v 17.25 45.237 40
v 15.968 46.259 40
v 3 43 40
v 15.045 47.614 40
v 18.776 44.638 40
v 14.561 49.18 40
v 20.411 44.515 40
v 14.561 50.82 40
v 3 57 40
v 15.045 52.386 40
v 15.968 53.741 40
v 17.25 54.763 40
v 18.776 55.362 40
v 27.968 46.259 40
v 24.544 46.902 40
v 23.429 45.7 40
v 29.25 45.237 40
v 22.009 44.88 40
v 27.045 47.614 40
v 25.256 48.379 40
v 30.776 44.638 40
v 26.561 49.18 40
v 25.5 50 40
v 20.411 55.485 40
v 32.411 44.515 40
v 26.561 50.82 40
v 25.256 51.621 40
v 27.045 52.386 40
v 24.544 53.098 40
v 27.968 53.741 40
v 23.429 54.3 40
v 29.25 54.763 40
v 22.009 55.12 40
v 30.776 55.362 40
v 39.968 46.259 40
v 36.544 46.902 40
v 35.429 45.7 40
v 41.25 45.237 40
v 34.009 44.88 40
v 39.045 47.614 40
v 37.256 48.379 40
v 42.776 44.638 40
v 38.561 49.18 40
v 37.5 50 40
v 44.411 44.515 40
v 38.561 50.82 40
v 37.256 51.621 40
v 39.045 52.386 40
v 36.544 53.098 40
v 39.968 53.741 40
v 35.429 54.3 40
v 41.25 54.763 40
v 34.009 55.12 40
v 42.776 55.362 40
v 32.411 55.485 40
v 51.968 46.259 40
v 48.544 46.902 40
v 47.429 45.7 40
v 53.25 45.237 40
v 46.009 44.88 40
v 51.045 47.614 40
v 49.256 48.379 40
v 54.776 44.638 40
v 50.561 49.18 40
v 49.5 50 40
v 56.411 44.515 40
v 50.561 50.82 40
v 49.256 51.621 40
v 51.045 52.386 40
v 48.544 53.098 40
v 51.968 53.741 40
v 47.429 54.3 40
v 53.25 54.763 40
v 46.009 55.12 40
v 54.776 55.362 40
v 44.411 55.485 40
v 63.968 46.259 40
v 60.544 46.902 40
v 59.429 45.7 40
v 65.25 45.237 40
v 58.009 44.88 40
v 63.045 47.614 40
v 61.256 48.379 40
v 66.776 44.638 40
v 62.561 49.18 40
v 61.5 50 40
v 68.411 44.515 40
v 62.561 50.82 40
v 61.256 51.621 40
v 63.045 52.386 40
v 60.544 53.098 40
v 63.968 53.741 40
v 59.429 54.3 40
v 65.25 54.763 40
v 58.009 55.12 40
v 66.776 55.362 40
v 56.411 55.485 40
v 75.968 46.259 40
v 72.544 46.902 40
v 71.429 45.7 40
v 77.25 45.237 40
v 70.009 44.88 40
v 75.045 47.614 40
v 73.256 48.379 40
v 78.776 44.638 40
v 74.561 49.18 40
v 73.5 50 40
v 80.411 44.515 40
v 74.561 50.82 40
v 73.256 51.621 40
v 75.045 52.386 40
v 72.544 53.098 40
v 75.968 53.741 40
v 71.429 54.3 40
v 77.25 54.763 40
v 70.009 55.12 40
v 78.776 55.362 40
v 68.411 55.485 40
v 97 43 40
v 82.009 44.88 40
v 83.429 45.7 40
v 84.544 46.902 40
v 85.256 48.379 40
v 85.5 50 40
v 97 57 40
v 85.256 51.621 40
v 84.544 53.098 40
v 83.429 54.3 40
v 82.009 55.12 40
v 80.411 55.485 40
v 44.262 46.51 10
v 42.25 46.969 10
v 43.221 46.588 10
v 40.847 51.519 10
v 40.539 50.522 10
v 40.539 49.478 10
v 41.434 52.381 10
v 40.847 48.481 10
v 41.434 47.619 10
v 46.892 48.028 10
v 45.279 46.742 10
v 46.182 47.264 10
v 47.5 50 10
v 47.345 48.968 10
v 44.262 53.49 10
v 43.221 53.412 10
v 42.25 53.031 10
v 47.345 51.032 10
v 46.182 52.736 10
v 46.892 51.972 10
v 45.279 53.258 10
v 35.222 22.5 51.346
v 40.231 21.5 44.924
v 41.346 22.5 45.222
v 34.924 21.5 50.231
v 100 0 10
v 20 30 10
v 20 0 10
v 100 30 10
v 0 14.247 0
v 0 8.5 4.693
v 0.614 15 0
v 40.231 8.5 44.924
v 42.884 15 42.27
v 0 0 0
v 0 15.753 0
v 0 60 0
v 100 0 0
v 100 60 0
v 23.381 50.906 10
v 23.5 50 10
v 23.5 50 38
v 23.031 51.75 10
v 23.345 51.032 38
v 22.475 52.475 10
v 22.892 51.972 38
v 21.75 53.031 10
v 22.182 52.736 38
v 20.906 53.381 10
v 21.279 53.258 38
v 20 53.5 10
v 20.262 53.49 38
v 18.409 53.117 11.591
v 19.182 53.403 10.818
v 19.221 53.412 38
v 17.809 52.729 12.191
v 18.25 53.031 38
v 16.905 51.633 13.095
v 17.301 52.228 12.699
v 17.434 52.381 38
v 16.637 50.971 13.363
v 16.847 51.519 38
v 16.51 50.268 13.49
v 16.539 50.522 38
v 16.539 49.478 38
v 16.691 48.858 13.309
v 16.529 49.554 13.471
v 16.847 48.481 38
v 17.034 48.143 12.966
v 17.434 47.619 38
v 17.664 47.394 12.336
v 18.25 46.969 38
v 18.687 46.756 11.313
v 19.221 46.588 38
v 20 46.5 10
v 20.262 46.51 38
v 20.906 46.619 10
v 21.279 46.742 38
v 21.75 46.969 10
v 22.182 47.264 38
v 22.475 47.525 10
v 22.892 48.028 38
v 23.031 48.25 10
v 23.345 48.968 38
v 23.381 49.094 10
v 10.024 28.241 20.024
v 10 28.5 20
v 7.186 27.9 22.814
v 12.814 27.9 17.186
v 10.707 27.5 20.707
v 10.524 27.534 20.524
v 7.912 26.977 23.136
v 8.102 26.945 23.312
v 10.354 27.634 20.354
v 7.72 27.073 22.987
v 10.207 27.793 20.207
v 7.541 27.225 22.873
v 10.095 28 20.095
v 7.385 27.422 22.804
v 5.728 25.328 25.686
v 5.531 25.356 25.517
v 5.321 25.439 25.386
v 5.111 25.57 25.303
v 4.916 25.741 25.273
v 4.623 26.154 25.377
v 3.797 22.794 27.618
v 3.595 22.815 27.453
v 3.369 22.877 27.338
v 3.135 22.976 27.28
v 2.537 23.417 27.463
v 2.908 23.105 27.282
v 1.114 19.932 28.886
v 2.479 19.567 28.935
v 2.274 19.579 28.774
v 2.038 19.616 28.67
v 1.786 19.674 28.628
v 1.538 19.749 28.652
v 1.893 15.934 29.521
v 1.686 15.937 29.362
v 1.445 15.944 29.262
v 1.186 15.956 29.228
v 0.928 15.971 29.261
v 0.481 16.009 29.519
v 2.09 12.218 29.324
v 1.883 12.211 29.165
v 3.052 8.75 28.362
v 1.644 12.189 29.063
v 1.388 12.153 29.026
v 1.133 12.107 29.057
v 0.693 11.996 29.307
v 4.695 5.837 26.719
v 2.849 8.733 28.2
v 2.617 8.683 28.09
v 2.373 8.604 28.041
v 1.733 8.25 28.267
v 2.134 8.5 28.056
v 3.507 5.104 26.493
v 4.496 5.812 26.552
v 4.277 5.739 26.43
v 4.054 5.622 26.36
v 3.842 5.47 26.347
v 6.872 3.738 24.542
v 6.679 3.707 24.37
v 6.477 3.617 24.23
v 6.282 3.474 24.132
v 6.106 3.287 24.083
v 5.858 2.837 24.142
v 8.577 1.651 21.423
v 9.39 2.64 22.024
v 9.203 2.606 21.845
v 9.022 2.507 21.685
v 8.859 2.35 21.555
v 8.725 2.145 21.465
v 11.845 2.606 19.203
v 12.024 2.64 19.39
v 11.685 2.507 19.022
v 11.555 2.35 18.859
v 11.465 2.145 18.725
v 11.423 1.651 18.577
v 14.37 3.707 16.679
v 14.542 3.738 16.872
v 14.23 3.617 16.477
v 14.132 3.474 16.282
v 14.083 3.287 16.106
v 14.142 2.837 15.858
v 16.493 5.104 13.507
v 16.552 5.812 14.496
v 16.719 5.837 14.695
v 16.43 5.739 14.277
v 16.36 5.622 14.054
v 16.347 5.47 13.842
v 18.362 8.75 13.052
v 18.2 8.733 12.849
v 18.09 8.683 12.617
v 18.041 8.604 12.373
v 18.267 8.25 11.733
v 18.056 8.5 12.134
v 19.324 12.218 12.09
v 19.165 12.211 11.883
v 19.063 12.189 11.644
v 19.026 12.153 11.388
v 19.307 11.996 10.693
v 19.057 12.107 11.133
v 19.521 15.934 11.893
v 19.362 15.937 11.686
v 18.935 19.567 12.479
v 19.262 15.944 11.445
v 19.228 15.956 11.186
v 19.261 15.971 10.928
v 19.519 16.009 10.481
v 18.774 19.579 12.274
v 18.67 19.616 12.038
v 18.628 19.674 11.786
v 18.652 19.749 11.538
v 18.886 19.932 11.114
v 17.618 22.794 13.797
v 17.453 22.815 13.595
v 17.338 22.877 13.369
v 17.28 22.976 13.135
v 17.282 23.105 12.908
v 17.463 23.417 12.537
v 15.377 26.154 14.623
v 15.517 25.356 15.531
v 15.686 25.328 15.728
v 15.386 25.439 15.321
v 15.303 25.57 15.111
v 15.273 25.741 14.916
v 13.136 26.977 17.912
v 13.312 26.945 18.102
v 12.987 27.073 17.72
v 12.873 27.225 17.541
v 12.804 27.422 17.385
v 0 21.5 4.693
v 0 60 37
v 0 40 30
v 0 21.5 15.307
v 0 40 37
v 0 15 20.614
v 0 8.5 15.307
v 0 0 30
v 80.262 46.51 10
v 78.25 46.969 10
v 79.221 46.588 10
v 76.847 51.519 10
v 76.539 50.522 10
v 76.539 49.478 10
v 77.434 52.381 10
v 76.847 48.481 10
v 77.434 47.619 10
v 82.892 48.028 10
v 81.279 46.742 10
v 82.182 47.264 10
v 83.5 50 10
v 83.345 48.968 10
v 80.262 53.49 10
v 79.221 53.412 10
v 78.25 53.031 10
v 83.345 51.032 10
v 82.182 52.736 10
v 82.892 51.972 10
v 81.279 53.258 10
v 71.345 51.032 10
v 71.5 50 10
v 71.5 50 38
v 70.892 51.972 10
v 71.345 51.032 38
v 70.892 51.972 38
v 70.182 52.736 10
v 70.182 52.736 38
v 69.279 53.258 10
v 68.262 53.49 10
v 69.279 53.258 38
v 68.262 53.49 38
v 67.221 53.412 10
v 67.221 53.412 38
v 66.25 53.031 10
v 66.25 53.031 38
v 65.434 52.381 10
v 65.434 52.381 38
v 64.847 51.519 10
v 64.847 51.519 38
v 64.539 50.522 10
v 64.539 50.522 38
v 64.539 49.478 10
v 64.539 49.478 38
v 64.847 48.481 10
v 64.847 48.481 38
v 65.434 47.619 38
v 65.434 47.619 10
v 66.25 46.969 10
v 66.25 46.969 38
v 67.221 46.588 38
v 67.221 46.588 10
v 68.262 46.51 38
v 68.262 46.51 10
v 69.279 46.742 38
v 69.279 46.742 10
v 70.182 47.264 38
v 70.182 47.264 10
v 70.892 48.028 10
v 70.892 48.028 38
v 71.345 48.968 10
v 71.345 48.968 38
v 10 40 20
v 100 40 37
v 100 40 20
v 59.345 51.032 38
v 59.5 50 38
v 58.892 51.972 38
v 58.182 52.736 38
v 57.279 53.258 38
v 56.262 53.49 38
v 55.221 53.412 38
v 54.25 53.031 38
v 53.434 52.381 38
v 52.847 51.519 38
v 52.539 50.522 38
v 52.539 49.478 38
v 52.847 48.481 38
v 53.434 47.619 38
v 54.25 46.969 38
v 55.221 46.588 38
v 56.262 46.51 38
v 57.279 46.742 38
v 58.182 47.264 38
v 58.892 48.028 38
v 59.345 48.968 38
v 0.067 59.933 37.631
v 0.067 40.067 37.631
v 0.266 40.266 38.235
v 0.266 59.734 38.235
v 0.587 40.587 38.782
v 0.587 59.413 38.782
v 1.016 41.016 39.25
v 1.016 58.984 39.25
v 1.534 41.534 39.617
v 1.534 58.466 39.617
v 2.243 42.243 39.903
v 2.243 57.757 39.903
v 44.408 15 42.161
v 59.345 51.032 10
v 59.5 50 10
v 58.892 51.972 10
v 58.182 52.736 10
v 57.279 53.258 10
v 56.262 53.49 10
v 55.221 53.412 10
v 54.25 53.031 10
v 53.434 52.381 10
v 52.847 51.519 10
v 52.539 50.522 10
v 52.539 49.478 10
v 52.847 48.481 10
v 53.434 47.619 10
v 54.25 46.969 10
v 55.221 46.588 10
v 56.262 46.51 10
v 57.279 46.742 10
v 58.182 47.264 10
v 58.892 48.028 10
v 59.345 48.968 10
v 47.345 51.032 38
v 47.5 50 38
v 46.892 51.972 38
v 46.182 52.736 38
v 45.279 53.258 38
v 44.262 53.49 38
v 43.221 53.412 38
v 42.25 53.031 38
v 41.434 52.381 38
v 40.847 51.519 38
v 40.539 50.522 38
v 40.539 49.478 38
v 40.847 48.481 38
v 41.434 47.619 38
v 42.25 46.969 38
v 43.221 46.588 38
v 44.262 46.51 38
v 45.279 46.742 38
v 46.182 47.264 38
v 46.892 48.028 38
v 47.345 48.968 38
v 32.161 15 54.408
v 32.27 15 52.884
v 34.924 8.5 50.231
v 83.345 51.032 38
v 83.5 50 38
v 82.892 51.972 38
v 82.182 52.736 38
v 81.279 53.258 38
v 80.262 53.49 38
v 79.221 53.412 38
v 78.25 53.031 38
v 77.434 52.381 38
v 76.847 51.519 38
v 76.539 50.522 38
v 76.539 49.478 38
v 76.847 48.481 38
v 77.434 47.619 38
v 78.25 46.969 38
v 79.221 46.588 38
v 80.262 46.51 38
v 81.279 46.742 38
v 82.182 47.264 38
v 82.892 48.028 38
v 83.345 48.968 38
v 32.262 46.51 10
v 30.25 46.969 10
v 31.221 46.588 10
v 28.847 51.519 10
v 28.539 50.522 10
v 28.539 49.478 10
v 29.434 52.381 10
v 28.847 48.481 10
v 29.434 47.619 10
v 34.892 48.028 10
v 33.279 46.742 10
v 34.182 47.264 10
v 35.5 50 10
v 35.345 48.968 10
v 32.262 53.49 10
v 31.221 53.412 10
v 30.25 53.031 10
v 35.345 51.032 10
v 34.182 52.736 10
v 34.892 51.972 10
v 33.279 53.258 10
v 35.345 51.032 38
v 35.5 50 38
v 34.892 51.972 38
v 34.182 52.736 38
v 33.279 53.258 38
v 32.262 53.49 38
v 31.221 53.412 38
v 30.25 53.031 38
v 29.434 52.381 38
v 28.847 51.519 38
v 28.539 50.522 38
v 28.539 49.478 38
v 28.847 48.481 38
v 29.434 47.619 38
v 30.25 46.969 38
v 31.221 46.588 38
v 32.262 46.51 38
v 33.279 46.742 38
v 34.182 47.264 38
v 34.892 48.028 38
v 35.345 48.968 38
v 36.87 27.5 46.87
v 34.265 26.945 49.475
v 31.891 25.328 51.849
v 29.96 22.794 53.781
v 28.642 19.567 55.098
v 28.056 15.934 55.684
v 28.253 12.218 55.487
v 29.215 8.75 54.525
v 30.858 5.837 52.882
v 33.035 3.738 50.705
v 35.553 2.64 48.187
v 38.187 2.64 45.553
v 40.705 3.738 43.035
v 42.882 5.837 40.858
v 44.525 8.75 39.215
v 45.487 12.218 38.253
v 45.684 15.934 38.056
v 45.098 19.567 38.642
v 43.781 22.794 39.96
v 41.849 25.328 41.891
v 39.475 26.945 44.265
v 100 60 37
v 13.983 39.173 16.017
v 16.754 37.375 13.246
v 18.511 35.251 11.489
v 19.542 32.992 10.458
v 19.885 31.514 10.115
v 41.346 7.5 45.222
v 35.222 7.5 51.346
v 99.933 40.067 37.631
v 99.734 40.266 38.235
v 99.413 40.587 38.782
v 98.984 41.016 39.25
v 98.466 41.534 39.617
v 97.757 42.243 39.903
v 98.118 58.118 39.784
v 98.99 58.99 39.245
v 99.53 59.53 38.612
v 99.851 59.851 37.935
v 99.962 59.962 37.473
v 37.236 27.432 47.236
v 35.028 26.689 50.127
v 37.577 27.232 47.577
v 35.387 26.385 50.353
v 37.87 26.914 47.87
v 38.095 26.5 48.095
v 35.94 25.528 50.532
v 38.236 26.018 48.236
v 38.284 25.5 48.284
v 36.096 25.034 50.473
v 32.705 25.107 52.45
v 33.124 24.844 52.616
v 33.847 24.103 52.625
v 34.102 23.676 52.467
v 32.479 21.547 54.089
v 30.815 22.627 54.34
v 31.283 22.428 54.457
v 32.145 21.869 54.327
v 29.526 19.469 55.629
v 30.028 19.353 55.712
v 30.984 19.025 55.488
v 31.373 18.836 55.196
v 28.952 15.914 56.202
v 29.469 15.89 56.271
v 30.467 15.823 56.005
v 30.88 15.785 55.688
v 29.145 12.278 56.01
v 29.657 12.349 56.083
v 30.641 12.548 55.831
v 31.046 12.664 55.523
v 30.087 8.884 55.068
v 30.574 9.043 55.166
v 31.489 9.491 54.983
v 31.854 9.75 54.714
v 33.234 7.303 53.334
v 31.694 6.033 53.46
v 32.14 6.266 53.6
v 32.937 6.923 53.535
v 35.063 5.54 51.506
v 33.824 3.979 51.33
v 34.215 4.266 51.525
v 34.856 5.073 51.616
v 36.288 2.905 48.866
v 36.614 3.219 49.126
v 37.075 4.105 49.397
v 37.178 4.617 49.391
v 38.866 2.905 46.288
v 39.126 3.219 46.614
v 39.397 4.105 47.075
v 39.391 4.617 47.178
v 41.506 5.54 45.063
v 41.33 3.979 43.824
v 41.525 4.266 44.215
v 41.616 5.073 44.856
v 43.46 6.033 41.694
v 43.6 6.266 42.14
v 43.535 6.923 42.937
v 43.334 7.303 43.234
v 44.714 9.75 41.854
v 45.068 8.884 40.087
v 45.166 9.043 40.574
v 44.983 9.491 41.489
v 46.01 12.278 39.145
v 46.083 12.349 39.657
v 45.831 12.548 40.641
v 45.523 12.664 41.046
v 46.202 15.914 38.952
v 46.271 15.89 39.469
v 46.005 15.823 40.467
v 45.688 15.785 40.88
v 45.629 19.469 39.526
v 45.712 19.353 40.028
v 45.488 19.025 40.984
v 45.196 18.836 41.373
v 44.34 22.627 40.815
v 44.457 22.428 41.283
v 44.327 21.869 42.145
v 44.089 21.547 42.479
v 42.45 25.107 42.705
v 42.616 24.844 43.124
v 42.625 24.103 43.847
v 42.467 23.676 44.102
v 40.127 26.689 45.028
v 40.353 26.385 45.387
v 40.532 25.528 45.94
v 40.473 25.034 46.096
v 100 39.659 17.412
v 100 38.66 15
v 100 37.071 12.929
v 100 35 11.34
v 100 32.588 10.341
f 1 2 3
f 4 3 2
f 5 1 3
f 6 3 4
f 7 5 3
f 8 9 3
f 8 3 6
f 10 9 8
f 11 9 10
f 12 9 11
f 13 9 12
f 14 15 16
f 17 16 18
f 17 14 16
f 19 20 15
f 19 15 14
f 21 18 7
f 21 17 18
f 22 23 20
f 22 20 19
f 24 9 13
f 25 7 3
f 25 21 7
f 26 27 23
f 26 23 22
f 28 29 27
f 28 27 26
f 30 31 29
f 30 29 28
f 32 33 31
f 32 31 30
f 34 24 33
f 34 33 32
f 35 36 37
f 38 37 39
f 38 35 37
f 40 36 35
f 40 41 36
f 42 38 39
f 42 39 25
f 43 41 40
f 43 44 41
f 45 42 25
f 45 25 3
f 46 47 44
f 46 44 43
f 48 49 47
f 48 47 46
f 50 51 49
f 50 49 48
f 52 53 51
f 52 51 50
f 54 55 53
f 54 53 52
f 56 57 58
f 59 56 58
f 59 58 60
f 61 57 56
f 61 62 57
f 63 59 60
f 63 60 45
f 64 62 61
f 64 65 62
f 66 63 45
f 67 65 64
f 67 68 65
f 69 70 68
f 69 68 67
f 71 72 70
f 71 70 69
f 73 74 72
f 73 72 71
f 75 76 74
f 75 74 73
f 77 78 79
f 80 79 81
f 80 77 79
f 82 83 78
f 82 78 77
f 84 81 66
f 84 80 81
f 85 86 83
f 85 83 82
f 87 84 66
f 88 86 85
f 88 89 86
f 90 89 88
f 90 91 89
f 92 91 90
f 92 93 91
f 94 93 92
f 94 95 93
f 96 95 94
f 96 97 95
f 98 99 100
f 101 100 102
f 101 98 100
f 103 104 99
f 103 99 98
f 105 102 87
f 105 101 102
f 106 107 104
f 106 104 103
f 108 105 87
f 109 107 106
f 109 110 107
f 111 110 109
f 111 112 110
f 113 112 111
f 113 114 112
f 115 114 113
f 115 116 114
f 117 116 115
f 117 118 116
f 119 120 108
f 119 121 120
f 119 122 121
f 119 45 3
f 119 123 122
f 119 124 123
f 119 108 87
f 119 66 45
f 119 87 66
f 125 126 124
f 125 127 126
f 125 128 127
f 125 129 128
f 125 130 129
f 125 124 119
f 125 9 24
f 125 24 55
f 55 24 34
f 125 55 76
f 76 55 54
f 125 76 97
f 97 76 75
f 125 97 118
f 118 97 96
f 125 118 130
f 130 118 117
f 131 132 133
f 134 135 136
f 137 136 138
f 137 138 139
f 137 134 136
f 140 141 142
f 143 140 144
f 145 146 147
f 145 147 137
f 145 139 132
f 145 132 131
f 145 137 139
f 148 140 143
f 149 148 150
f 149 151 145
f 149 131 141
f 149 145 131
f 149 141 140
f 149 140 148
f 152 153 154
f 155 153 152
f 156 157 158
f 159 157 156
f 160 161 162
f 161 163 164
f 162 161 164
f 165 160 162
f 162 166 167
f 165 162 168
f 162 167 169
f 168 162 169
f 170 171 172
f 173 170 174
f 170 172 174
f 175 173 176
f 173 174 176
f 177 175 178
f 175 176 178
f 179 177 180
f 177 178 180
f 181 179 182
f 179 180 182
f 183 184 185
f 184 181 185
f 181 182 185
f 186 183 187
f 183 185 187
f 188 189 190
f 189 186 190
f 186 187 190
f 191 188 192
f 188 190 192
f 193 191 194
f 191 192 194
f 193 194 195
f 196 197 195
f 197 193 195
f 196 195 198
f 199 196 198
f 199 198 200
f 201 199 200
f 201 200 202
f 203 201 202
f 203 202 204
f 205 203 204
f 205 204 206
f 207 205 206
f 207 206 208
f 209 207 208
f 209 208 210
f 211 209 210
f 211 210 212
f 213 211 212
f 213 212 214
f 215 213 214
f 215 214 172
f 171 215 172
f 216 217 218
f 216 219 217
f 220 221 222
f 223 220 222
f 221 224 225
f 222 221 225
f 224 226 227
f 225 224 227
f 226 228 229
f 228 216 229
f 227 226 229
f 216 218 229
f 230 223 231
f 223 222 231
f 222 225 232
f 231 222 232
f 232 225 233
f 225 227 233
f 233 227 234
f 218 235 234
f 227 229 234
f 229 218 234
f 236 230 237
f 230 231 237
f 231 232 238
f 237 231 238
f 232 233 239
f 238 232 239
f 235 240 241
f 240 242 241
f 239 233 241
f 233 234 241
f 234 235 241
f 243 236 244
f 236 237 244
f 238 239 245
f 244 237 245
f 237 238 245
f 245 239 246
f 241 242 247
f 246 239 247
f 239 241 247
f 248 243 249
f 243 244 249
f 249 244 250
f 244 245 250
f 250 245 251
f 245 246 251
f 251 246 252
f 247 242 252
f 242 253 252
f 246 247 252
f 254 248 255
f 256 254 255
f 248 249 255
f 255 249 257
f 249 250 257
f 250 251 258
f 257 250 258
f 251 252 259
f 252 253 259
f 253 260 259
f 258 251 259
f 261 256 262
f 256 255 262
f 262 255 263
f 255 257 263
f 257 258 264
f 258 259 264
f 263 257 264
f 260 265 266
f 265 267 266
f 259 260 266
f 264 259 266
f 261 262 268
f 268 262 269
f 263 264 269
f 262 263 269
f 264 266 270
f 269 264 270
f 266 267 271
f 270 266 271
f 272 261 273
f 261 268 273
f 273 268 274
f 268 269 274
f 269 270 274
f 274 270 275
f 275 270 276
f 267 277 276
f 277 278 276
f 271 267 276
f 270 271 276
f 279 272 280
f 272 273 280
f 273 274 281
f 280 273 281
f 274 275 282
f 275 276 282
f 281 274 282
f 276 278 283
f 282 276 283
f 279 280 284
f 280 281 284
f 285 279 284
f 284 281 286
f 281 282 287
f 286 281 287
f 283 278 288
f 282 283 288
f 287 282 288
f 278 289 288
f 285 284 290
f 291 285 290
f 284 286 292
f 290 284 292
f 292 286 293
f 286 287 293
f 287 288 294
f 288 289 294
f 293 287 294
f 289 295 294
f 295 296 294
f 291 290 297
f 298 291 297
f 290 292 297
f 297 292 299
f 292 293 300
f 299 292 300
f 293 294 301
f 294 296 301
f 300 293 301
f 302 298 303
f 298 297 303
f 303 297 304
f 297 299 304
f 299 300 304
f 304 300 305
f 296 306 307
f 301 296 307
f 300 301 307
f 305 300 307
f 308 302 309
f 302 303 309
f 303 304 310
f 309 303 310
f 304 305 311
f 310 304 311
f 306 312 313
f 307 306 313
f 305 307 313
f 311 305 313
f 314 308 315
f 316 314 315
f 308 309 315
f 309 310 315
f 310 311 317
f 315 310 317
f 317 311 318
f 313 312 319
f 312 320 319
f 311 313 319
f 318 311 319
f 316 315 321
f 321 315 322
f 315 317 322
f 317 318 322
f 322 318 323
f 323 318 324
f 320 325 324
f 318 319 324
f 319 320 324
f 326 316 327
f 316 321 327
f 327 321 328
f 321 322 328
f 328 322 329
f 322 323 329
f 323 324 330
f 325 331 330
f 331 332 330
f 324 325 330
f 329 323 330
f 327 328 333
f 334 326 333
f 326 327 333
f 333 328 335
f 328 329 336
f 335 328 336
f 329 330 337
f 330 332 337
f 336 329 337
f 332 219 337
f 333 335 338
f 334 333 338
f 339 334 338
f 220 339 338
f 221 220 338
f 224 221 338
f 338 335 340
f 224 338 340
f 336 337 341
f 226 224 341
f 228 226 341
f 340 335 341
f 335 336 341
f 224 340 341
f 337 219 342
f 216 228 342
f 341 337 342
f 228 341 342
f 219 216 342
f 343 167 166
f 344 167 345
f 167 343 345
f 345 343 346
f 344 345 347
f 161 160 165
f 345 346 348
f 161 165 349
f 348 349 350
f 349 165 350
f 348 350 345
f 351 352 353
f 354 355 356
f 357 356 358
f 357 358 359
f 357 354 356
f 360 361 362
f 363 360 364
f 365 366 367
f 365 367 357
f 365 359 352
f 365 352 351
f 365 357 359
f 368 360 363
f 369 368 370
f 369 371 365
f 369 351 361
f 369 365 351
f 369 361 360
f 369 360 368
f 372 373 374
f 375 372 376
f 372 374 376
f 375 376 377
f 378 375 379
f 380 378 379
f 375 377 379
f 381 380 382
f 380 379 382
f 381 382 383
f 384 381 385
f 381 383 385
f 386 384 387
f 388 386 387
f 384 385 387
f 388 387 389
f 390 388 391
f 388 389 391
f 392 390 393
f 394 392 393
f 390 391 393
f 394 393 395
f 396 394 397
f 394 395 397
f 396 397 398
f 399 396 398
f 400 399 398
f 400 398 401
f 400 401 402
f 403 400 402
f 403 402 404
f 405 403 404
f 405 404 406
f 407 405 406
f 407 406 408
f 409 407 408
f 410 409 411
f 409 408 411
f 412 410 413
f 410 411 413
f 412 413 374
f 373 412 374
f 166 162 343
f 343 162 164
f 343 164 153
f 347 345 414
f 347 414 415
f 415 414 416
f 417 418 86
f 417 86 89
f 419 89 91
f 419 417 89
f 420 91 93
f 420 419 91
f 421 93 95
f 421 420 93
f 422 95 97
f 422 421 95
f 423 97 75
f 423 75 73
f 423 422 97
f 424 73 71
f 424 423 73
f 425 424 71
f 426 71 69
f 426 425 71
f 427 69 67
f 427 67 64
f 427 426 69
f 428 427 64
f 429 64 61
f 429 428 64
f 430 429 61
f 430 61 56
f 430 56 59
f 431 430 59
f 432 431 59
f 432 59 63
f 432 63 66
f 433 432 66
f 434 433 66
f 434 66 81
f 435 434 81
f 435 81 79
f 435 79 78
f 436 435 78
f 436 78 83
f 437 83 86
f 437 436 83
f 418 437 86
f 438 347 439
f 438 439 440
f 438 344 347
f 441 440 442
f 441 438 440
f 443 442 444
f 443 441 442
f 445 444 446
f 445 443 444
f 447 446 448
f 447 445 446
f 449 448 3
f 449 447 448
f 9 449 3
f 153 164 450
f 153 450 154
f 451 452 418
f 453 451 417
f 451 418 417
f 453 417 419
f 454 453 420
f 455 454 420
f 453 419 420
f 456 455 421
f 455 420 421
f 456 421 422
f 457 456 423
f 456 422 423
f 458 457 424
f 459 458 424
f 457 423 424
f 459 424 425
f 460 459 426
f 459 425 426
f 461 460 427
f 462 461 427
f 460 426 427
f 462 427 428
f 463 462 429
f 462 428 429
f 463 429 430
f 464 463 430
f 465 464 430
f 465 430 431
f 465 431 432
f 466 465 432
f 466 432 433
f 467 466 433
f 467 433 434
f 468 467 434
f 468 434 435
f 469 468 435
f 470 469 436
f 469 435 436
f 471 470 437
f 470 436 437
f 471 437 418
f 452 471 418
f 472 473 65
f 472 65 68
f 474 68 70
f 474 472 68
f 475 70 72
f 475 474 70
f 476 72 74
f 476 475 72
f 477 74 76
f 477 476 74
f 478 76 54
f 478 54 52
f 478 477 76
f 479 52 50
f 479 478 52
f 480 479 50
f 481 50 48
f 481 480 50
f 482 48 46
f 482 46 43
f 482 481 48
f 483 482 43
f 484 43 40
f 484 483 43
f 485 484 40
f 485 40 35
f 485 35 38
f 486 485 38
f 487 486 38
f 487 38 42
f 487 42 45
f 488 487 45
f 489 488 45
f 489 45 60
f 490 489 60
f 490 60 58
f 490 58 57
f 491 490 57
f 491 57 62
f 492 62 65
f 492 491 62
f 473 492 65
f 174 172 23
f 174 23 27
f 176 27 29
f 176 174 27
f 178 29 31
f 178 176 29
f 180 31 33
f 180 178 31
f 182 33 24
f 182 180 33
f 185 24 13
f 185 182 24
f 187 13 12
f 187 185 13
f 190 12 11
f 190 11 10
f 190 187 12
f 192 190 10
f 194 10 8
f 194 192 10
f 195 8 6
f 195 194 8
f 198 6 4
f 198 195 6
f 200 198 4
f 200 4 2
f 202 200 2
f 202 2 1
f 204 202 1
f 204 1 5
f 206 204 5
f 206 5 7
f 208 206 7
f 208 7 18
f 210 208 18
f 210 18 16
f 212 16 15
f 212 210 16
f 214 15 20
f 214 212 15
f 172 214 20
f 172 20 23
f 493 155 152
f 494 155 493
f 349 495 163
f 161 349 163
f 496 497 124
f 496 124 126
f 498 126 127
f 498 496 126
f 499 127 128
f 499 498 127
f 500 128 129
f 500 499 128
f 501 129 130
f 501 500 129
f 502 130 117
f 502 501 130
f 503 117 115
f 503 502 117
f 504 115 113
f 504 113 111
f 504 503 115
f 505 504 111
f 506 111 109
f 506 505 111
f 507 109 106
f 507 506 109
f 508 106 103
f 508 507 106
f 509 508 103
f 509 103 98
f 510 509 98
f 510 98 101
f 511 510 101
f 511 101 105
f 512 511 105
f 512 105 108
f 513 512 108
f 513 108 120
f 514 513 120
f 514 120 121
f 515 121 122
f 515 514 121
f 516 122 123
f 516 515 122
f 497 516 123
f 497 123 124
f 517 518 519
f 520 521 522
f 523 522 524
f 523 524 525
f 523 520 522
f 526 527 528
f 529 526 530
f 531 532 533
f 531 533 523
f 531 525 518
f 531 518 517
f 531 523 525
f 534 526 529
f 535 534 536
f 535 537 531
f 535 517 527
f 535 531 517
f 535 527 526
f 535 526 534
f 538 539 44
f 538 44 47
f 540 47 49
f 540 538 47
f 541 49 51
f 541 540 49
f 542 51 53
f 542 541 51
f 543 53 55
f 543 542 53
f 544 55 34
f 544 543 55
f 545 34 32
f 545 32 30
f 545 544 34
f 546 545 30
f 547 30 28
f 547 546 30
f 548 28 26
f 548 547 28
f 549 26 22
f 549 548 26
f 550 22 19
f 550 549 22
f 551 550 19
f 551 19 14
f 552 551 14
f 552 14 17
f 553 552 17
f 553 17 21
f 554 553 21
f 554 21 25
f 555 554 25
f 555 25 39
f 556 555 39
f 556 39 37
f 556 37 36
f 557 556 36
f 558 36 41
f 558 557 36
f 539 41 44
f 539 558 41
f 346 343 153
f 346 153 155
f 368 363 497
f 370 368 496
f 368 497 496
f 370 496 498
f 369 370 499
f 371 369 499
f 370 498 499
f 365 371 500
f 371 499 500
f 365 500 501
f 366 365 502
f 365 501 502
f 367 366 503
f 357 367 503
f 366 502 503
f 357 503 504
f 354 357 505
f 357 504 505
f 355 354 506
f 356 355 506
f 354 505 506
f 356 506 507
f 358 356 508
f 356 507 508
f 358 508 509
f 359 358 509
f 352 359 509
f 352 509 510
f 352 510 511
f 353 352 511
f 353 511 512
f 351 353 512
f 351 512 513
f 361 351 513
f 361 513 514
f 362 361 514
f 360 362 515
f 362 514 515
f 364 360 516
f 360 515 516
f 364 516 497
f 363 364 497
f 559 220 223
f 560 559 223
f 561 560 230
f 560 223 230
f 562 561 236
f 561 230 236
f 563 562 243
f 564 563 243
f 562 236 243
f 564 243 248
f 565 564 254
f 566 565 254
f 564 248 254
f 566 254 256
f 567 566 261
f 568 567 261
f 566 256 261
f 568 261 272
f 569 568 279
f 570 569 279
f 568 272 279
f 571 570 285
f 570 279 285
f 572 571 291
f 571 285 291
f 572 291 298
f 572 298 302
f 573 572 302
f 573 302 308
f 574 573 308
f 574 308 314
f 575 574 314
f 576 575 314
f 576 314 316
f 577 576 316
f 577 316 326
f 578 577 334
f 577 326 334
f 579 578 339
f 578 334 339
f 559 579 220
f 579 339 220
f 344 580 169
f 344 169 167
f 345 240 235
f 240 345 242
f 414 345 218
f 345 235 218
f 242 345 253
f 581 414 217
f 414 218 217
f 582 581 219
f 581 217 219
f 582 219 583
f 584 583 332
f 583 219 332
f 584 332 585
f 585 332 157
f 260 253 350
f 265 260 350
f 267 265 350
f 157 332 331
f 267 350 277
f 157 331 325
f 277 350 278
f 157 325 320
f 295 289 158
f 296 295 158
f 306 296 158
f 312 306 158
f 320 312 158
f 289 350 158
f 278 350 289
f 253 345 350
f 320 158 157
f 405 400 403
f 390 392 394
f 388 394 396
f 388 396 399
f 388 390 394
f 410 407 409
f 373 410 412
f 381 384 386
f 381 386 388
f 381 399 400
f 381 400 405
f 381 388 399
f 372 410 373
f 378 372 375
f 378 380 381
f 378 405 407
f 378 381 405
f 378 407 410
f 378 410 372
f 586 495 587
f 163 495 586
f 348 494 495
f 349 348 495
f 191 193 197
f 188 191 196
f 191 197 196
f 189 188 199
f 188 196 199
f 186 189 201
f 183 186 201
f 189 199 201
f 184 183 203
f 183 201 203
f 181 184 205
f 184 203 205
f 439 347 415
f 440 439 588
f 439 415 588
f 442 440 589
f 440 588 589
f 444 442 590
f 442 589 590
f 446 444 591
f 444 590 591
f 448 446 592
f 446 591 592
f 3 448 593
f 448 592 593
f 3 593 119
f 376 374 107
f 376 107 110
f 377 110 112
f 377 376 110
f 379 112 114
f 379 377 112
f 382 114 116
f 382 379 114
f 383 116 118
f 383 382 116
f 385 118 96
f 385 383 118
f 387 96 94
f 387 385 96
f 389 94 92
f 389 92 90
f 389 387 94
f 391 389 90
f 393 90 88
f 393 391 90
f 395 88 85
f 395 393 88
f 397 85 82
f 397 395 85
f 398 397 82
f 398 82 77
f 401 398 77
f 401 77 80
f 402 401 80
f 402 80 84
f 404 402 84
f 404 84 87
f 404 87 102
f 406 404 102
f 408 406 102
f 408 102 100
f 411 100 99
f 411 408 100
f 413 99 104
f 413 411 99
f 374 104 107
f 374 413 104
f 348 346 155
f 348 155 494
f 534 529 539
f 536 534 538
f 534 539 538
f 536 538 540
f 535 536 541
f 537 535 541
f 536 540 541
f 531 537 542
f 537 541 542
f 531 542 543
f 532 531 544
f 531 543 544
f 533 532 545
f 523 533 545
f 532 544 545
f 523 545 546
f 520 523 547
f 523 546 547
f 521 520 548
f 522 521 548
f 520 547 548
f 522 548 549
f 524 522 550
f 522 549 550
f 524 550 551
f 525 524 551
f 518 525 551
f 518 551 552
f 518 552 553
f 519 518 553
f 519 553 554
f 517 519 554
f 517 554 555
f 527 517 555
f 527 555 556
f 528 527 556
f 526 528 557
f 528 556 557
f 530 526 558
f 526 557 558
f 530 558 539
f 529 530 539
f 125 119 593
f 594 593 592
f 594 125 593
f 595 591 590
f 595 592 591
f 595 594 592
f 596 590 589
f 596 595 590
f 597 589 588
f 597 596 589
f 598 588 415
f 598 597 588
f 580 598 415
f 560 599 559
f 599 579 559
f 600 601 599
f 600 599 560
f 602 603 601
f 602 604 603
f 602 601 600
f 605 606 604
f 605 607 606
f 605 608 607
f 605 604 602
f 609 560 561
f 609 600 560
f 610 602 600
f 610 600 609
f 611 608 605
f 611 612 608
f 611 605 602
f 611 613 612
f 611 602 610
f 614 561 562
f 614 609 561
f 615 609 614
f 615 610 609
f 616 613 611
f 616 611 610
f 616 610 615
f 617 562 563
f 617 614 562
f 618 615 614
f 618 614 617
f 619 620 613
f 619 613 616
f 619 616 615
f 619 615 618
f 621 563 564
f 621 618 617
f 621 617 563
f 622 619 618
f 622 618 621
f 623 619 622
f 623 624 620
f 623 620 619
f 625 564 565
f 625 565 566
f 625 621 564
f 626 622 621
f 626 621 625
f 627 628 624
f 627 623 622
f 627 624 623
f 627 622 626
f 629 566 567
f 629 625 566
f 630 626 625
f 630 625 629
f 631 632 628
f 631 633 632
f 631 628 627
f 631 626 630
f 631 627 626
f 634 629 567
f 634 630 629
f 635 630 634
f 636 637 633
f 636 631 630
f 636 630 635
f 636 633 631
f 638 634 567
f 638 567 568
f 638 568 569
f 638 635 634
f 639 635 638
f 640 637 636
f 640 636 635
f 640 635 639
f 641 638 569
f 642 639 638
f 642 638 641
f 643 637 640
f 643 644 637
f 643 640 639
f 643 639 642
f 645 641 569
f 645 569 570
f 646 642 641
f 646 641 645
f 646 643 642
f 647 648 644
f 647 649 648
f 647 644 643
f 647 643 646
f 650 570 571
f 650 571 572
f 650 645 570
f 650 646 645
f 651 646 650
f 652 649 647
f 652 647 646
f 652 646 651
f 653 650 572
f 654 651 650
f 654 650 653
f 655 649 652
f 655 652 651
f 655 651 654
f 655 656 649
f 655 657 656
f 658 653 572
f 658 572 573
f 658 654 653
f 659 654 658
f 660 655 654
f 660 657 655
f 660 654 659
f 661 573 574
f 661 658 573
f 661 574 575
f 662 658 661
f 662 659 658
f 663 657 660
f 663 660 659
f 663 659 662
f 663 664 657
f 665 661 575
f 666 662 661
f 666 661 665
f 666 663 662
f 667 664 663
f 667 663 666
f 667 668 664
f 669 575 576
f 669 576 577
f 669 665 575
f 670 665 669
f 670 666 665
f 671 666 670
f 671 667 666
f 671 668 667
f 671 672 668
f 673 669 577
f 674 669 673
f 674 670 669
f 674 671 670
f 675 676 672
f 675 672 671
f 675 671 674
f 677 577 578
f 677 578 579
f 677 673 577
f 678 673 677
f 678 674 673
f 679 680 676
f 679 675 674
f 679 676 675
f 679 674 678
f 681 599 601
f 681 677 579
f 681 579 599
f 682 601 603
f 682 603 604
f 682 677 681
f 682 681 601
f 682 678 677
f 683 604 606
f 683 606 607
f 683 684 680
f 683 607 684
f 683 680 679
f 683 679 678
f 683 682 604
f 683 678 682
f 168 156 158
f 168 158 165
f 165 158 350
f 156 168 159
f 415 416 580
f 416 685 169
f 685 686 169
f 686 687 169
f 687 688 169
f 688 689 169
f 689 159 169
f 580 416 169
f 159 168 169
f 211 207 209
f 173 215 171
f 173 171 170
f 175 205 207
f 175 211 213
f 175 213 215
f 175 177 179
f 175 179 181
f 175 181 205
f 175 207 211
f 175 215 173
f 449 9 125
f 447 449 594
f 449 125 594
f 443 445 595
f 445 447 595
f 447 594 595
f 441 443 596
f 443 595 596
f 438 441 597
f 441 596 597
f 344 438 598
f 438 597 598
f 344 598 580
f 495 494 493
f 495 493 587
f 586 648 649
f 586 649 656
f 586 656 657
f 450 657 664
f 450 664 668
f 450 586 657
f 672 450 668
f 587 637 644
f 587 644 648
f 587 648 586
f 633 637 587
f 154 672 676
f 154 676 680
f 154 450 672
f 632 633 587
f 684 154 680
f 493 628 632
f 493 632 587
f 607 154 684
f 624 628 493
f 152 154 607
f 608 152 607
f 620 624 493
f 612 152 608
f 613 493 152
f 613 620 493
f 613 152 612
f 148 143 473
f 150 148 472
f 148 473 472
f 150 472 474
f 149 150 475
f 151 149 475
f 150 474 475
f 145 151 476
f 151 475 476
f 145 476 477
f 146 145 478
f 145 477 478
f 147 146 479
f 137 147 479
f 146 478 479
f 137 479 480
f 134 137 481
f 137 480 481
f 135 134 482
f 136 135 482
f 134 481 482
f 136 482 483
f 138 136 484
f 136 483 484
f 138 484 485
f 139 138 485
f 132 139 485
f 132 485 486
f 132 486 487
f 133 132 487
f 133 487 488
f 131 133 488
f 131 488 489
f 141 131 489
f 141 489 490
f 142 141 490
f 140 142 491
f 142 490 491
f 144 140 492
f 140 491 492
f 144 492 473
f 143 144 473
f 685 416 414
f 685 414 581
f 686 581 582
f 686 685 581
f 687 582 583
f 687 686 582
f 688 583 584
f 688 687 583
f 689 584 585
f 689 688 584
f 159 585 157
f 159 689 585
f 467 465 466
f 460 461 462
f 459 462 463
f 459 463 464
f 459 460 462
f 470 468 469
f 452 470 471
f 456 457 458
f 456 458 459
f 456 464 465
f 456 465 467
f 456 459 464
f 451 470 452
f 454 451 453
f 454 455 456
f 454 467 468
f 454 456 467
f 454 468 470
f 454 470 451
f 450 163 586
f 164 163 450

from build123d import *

# Parameters (mm, degrees)
SKETCH_W            = 100
SKETCH_H            = 60
PAD_DEPTH           = 10
SKETCH001_W         = 100
SKETCH001_H         = 20
PAD001_DEPTH        = 30
SKETCH002_R         = 3.5
POCKET_DEPTH        = 30
LINEARPATTERN_COUNT = 6
LINEARPATTERN_PITCH = 12
CHAMFER_SIZE        = 2
FILLET_R            = 10
FILLET001_R         = 3
PAD002_DEPTH        = 60
SKETCH004_R         = 12.5
PAD003_DEPTH        = 40
POCKET001_DEPTH     = 61.2142034356
FILLET002_R         = 2
CHAMFER001_SIZE     = 1
FILLET003_R         = 1


with BuildPart() as part:
    # Sketch → Pad (new body)
    with BuildSketch(Plane.XY):
        with Locations((50, 30)):
            Rectangle(SKETCH_W, SKETCH_H)
    extrude(amount=PAD_DEPTH)

    # Sketch001 (on Face6 of Pad) → Pad001 (join)
    with BuildSketch(Plane.XY.offset(10)):
        with Locations((50, 50)):
            Rectangle(SKETCH001_W, SKETCH001_H)
    extrude(amount=PAD001_DEPTH)

    # Sketch002 (on Face11 of Pad001) → Pocket (cut)
    with BuildSketch(Plane.XY.offset(40)):
        with Locations((80, 50)):
            Circle(SKETCH002_R)
    pocket = extrude(amount=-POCKET_DEPTH, mode=Mode.SUBTRACT)

    # LinearPattern: Pocket ×6
    with Locations(*[(-i * LINEARPATTERN_PITCH, 0, 0) for i in range(1, LINEARPATTERN_COUNT)]):
        add(pocket, mode=Mode.SUBTRACT)

    # Chamfer
    chamfer_edges = [part.edges().sort_by_distance(p)[0] for p in [
        (28.5, 50, 40),
        (16.5, 50, 40),
        (40.5, 50, 40),
        (52.5, 50, 40),
        (64.5, 50, 40),
        (76.5, 50, 40),
    ]]
    chamfer(chamfer_edges, length=CHAMFER_SIZE)

    # Fillet
    fillet_edges = [part.edges().sort_by_distance(p)[0] for p in [
        (50, 40, 10),
    ]]
    fillet(fillet_edges, radius=FILLET_R)

    # Fillet001
    fillet001_edges = [part.edges().sort_by_distance(p)[0] for p in [
        (0, 50, 40),
        (50, 60, 40),
        (50, 40, 40),
        (100, 50, 40),
    ]]
    fillet(fillet001_edges, radius=FILLET001_R)

    # Sketch003 (on Face13 of Fillet001) → Pad002 (join)
    with BuildSketch(Plane.XZ):
        Polygon((0, 10), (0, 30), (20, 10), align=None)
    extrude(amount=-PAD002_DEPTH)

    # Sketch004 (on Face7 of Pad002) → Pad003 (join)
    with BuildSketch(Plane(origin=(15, 0, 15), x_dir=(0, 1, 0), z_dir=(0.7071067812, 0, 0.7071067812))):
        with Locations((15, 7.0710678119)):
            Circle(SKETCH004_R)
    extrude(amount=PAD003_DEPTH)

    # Sketch005 (on Face22 of Pad003) → Pocket001 (cut, through all)
    with BuildSketch(Plane(origin=(43.2842712475, 0, 43.2842712475), x_dir=(0.7071067812, 0, -0.7071067812), z_dir=(0.7071067812, 0, 0.7071067812))):
        Polygon((-3.3182910621, 21.5), (-10.8238445616, 21.5), (-14.5766213113, 15), (-10.8238445616, 8.5), (-3.3182910621, 8.5), (0.4344856876, 15), align=None)
    extrude(amount=-POCKET001_DEPTH, mode=Mode.SUBTRACT)

    # Fillet002
    fillet002_edges = [part.edges().sort_by_distance(p)[0] for p in [
        (38.284271, 2.5, 48.284271),
    ]]
    fillet(fillet002_edges, radius=FILLET002_R)

    # Chamfer001
    chamfer001_edges = [part.edges().sort_by_distance(p)[0] for p in [
        (38.284271, 21.5, 48.284271),
        (34.30385, 18.25, 52.264692),
        (34.30385, 11.75, 52.264692),
        (38.284271, 8.5, 48.284271),
        (42.264692, 11.75, 44.30385),
        (42.264692, 18.25, 44.30385),
    ]]
    chamfer(chamfer001_edges, length=CHAMFER001_SIZE)

    # Fillet003
    fillet003_edges = [part.edges().sort_by_distance(p)[0] for p in [
        (10, 2.5, 20),
    ]]
    fillet(fillet003_edges, radius=FILLET003_R)


solid = part.part
